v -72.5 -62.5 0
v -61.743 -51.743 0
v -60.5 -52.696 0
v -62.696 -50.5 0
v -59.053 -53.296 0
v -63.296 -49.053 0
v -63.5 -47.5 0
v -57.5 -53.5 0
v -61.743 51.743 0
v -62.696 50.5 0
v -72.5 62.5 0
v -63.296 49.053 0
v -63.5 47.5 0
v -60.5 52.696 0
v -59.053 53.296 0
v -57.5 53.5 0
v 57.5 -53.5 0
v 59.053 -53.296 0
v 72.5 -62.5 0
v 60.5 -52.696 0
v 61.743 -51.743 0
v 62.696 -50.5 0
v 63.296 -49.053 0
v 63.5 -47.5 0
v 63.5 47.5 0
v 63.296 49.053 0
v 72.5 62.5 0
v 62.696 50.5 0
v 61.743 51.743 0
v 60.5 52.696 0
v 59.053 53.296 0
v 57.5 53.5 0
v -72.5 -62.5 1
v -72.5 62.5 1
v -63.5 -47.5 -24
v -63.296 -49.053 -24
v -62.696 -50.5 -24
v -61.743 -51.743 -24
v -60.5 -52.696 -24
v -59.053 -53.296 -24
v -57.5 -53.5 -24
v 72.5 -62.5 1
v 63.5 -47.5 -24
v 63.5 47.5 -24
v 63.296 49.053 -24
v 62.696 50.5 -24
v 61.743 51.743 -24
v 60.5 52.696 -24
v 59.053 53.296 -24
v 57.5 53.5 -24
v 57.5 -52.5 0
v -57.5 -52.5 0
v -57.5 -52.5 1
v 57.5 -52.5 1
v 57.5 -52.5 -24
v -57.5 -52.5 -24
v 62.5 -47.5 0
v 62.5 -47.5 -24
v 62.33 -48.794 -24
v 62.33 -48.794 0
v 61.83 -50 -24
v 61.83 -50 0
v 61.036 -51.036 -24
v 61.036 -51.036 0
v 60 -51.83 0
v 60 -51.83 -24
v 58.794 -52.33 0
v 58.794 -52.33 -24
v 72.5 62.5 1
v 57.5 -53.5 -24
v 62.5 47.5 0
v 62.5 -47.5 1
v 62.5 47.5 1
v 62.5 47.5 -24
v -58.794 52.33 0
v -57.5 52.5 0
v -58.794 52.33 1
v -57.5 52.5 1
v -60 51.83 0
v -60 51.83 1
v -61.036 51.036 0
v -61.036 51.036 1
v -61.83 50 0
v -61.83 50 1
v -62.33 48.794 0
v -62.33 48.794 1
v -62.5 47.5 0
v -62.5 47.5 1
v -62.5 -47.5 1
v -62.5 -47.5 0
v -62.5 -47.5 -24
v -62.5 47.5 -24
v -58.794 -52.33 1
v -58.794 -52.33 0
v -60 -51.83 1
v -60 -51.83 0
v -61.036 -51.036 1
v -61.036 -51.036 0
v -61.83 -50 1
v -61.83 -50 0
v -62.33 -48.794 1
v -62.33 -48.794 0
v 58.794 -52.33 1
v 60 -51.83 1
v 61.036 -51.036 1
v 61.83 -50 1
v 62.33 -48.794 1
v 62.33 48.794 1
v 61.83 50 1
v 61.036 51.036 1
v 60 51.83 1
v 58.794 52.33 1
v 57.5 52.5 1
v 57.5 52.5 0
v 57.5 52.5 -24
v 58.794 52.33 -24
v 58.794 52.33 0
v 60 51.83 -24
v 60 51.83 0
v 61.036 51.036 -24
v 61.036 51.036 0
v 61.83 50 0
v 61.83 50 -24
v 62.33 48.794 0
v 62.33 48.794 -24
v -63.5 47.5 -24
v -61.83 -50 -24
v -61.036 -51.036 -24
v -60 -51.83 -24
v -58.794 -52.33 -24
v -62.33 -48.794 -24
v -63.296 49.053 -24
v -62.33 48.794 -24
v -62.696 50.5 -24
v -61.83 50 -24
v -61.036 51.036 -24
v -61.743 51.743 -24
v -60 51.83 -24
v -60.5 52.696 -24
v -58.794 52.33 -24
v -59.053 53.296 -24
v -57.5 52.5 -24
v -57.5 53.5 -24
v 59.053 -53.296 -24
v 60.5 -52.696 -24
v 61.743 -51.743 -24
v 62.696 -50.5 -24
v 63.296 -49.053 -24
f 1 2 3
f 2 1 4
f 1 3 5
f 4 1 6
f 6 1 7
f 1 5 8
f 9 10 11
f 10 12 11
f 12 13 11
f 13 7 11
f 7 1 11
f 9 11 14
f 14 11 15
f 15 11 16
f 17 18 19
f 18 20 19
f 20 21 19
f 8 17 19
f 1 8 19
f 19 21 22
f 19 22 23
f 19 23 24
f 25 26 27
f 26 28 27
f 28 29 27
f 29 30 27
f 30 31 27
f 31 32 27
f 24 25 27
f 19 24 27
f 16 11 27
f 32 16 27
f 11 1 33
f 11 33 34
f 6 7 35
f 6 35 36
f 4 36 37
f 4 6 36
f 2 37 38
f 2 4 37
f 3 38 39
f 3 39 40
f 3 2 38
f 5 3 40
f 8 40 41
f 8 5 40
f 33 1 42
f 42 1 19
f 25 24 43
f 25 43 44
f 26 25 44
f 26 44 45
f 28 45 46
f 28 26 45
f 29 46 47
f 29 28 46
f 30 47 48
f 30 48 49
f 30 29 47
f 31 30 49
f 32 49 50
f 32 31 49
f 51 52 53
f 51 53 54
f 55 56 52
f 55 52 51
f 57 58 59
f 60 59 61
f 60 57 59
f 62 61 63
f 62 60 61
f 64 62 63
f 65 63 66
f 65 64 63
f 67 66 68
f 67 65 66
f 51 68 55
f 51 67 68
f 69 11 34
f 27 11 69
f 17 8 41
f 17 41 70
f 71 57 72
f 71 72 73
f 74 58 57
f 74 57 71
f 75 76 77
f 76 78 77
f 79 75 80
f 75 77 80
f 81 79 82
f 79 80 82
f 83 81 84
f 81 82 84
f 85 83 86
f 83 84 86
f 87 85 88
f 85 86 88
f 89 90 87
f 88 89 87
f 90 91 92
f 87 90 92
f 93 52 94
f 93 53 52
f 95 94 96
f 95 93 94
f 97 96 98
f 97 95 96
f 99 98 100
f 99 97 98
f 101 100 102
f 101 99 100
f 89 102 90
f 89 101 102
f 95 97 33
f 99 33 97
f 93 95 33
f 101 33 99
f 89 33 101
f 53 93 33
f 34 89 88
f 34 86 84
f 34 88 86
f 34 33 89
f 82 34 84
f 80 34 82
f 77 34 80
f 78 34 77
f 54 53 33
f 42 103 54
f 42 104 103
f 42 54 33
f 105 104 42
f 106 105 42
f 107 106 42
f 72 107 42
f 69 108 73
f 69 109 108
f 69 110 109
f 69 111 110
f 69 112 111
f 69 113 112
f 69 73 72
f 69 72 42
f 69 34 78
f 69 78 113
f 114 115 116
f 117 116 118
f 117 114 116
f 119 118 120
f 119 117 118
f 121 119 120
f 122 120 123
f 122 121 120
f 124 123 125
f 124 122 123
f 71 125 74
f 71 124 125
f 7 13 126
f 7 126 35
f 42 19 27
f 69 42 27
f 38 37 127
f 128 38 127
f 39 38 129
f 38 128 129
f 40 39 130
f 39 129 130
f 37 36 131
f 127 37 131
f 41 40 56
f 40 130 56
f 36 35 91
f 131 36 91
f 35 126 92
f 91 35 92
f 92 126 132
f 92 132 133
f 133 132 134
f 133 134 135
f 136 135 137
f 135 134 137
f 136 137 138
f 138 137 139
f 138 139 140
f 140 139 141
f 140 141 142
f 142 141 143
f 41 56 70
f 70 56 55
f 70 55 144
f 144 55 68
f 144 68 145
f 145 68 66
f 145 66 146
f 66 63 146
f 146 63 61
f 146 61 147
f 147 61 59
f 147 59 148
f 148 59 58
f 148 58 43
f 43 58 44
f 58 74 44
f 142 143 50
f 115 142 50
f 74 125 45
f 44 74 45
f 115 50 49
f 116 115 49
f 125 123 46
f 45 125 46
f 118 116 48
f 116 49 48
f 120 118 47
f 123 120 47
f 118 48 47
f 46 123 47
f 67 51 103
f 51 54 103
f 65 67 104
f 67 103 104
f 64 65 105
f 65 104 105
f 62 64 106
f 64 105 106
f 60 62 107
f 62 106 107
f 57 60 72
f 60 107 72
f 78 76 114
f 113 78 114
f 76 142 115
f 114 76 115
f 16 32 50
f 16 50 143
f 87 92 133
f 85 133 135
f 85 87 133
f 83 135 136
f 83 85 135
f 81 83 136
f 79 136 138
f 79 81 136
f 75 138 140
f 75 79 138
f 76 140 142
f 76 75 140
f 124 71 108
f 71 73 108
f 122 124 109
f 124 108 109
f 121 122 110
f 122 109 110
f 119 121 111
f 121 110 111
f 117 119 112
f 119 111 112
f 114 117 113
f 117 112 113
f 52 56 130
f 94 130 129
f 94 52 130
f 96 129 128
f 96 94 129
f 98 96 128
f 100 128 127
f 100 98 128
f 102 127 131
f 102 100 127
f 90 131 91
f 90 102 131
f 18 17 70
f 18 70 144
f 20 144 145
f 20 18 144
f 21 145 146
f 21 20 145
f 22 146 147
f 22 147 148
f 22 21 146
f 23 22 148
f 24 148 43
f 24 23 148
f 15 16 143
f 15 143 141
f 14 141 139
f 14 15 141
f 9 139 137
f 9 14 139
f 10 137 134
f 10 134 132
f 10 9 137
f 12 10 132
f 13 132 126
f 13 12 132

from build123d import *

# Parameters (mm, degrees)
F0_W     = 145
F0_H     = 125
F0_W_2   = 125
F0_H_2   = 105
F1_DEPTH = 1
F2_R     = 5
F4_DEPTH = 25


with BuildPart() as f1:
    # F0 (on Top) → F1 (new body)
    with BuildSketch(Plane.XY):
        Rectangle(F0_W, F0_H)
        Rectangle(F0_W_2, F0_H_2, mode=Mode.SUBTRACT)
    extrude(amount=F1_DEPTH)

    # F2
    f2_edges = [f1.edges().sort_by_distance(p)[0] for p in [
        (-62.5, 52.5, 0.5),
        (-62.5, -52.5, 0.5),
        (62.5, -52.5, 0.5),
        (62.5, 52.5, 0.5),
    ]]
    fillet(f2_edges, radius=F2_R)

    # F3 (on face) → F4 (join)
    with BuildSketch(Plane.XY.offset(1)):
        with BuildLine():
            ThreePointArc((-57.5, 53.500002), (-61.742642, 51.742642), (-63.500002, 47.5))
            Line((-63.500002, 47.5), (-63.500002, -47.5))
            ThreePointArc((-63.500002, -47.5), (-61.742642, -51.742642), (-57.5, -53.500002))
            Line((-57.5, -53.500002), (57.5, -53.500002))
            ThreePointArc((57.5, -53.500002), (61.742642, -51.742642), (63.500002, -47.5))
            Line((63.500002, -47.5), (63.500002, 47.5))
            ThreePointArc((63.500002, 47.5), (61.742642, 51.742642), (57.5, 53.500002))
            Line((57.5, 53.500002), (-57.5, 53.500002))
        make_face()
        with BuildLine():
            ThreePointArc((-57.5, -52.5), (-61.035534, -51.035534), (-62.5, -47.5))
            Line((-62.5, -47.5), (-62.5, 47.5))
            ThreePointArc((-62.5, 47.5), (-61.035534, 51.035534), (-57.5, 52.5))
            Line((-57.5, 52.5), (57.5, 52.5))
            ThreePointArc((57.5, 52.5), (61.035534, 51.035534), (62.5, 47.5))
            Line((62.5, 47.5), (62.5, -47.5))
            ThreePointArc((62.5, -47.5), (61.035534, -51.035534), (57.5, -52.5))
            Line((57.5, -52.5), (-57.5, -52.5))
        make_face(mode=Mode.SUBTRACT)
    extrude(amount=-F4_DEPTH)


solid = f1.part
